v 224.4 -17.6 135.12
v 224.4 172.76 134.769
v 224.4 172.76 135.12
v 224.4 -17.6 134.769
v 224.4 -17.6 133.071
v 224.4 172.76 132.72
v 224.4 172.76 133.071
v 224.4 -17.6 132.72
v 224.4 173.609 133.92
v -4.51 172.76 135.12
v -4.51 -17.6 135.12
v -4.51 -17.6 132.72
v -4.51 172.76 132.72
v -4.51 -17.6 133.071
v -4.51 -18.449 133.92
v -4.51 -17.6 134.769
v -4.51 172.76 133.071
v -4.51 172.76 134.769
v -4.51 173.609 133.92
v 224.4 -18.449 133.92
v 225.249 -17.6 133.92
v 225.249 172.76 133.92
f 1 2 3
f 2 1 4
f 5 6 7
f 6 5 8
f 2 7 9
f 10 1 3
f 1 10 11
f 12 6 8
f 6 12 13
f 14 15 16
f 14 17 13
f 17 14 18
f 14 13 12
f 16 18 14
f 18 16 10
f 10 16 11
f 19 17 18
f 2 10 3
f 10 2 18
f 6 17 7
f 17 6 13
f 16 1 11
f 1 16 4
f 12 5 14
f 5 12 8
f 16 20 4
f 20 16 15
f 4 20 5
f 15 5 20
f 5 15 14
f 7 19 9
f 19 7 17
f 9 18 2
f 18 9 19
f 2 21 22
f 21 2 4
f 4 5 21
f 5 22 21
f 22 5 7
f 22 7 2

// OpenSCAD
// file: front_panel.scad
// Parametric Mini-ITX Case
// https://github.com/eclecticc/ParametricCase
//
// BSD 2-Clause License
// Copyright (c) 2018, Nirav Patel, http://eclecti.cc
//
// Front panel USB modules

include <defaults.scad>;

port_cutout = [15.1, 7.7];
port = [14.45, 7.00];
port_spacing = (11.84+42.08)/2;
screw_spacing = (56.71+62.80)/2;
screw_r = 3.1/2;
dual_usb_size = [67.5, 40.0, 11.0];

module dual_usb() {
    $fn = 20;
    
    color(c = [0.2, 0.2, 0.2]) {
        difference() {
            translate([-dual_usb_size[0]/2, 0, 0]) cube(dual_usb_size);
            translate([-screw_spacing/2, -1, dual_usb_size[2]/2]) rotate([-90, 0, 0]) cylinder(r = screw_r, h = 10);
            translate([screw_spacing/2, -1, dual_usb_size[2]/2]) rotate([-90, 0, 0]) cylinder(r = screw_r, h = 10);
        }
    }
    color("Silver", 1.0) {
        translate([port_spacing/2, -1, dual_usb_size[2]/2]) {
            translate([-port[0]/2, 0, -port[1]/2]) cube([port[0], 2, port[1]]);
            translate([-port[0]/2-port_spacing, 0, -port[1]/2]) cube([port[0], 2, port[1]]);
        }
    }
}

module dual_usb_cutout() {
    $fn = 20;
    translate([-screw_spacing/2, -wall-extra/2, dual_usb_size[2]/2]) rotate([-90, 0, 0]) cylinder(r = screw_r, h = wall+extra);
    translate([screw_spacing/2, -wall-extra/2, dual_usb_size[2]/2]) rotate([-90, 0, 0]) cylinder(r = screw_r, h = wall+extra);
    translate([port_spacing/2, -wall-extra/2, dual_usb_size[2]/2]) {
        translate([-port[0]/2, 0, -port[1]/2]) cube([port[0], wall+extra, port[1]]);
        translate([-port[0]/2-port_spacing, 0, -port[1]/2]) cube([port[0], wall+extra, port[1]]);
    }
}

//dual_usb();
//% dual_usb_cutout();
// file: power_switch.scad
// Parametric Mini-ITX Case
// https://github.com/eclecticc/ParametricCase
//
// BSD 2-Clause License
// Copyright (c) 2018, Nirav Patel, http://eclecti.cc
//
// Power switch modules

include <defaults.scad>;

power_switch_r = 16/2;
power_switch_h = 30;

module power_switch() {
    $fn = 50;
    
    // Body of the switch
    color("Silver", 1.0) {
        translate([0, 0, -power_switch_h]) cylinder(r = power_switch_r, h = power_switch_h);
        difference() {
            cylinder(r = 19/2, h = 1.6);
            cylinder(r = 12/2, h = 2);
        }
        cylinder(r = 10/2, h = 1.7);
    }
    
    // LED ring
    color("OrangeRed", 0.8) {
        difference() {
            cylinder(r = 12/2, h = 1.6);
            cylinder(r = 10/2, h = 2);
        }
    }
}

module power_switch_cutout() {
    $fn = 50;
    
    // Chassis cut-out
    translate([0, 0, -wall-extra/2]) cylinder(r = power_switch_r + 0.2, h = wall+extra);
}

//power_switch();
//% power_switch_cutout();
// file: motherboard.scad
// Parametric Mini-ITX Case
// https://github.com/eclecticc/ParametricCase
//
// BSD 2-Clause License
// Copyright (c) 2018, Nirav Patel, http://eclecti.cc
//
// Motherboard modules

include <defaults.scad>;

// Base PCB dimensions
miniitx = [170, 170, pcb_thickness];

// Motherboard mounting hold diameter and offsets (relative to hole c)
miniitx_hole = 3.96;
miniitx_hole_c = [10.16, 6.35];
miniitx_hole_f = [22.86, 157.48];
miniitx_hole_h = [154.94, 0];
miniitx_hole_j = [154.94, 157.48];

// Keepouts on top and bottom of board
miniitx_bottom_keepout = 0.25 * 25.4;

// AM4 Socket specs
am4_holes = [80, 95, 54, 90]; // Center not measured
am4_socket = [40, 40, 7.35]; // Not measured

// Offset from origin corner of motherboard to the base of the PCI-e card
pci_e_offset = [46.94+10.16, 47.29-45.72+6.35, 114.55-111.15];

module motherboard_miniitx(show_keepouts, socket_holes, socket) {
    area_a_keepout = [27, 15, 170-27-30, 170-15, 57];
    area_b_keepout = [0, 0, 170, 15, 16];
    area_c_keepout = [170-30, 15, 30, 170-15, 38];
    area_d_keepout = [0, 15, 27, 170-15, 39];
    $fn = 20;

    difference() {
        union() {
            // The PCB
            color("Green", 1.0) {
                cube(miniitx);
            }
            translate([socket_holes[0]-socket[0]/2, socket_holes[1]-socket[1]/2, miniitx[2]]) {
                color("OldLace", 1.0) {
                    cube(socket);
                }
            }
        }

        // Mounting holes for the motherboard
        translate([miniitx_hole_c[0], miniitx_hole_c[1], -extra/2]) {
            cylinder(r = miniitx_hole/2, h = miniitx[2]+extra);
            for (hole = [miniitx_hole_f, miniitx_hole_h, miniitx_hole_j]) {
                translate([hole[0], hole[1], 0]) cylinder(r = miniitx_hole/2, h = miniitx[2]+extra);
            }
        }

        // Mounting holes for the CPU cooler
        translate([socket_holes[0], socket_holes[1], -extra/2]) {
            for (i = [-socket_holes[2]/2, socket_holes[2]/2]) {
                for (j = [-socket_holes[3]/2, socket_holes[3]/2]) {
                    translate([i, j, 0]) cylinder(r = miniitx_hole/2, h = miniitx[2]+extra);
                }
            }
        }
    }

    // PCI-e slot
    color("DarkSlateGray", 1.0) {
        translate([pci_e_offset[0]-14.5, pci_e_offset[1]-7.5/2, miniitx[2]]) cube([89.0, 7.5, 11.25]);
    }

    // Keepouts for visualization purposes
    color("GreenYellow", 0.25) {
        if (show_keepouts == true) {
            translate([0, 0, -miniitx_bottom_keepout]) cube([miniitx[0], miniitx[1], miniitx_bottom_keepout]);

            for (keepout = [area_a_keepout, area_b_keepout, area_c_keepout, area_d_keepout]) {
                translate([keepout[0], keepout[1], miniitx[2]]) {
                    cube([keepout[2], keepout[3], keepout[4]]);
                }
            }
        }
    }
}

motherboard_back_edge = miniitx_hole_c[0]-12.27;
motherboard_back_panel_overhang = 158.75+7.52+6.35-miniitx[1];
motherboard_back_panel_lip = 2.54;
motherboard_back_panel_size = [158.75, 44.45];

module motherboard_back_panel_cutout() {
    // Cut-out for the back panel i/o
    translate([-extra/2+motherboard_back_edge-wall, miniitx_hole_c[1]+7.52, -2.24]) {
        cube([extra/2+wall+motherboard_back_edge+39, motherboard_back_panel_size[0], motherboard_back_panel_size[1]]);
        // Thin a 2.54mm area around the i/o down to a typical sheet metal thickness
        translate([0, -motherboard_back_panel_lip, -motherboard_back_panel_lip]) cube([extra/2+wall-1.2, 158.75+motherboard_back_panel_lip*2, 44.45+motherboard_back_panel_lip*2]);
    }
}

//motherboard_miniitx(false, am4_holes, am4_socket);
//% motherboard_back_panel_cutout();
// file: gpu.scad
// Parametric Mini-ITX Case
// https://github.com/eclecticc/ParametricCase
//
// BSD 2-Clause License
// Copyright (c) 2018, Nirav Patel, http://eclecti.cc
//
// PCI-e GPU modules

include <defaults.scad>;
include <fan.scad>;
include <pci_bracket.scad>;

pci_e_front_edge = -57.15;
pci_e_cutout_height = 8.25+(111.15-106.65);
pci_e_spacing = 47.29-26.97;
// Transform from pci e card datum to bracket datum
pci_e_to_bracket = [-64.13, 2.84-pcb_thickness, 100.36];

module dual_gpu( length, height) {
    // Using the bottom center of the notch as the datum
    color("Green", 1.0) {
        difference() {
            translate([pci_e_front_edge, -pcb_thickness/2, 0]) cube([length, pcb_thickness, height]);
            translate([pci_e_front_edge-extra, -pcb_thickness/2-extra/2, 0-extra]) cube([-pci_e_front_edge+extra-12.15, pcb_thickness+extra, pci_e_cutout_height]);
            translate([72.15, -pcb_thickness/2-extra/2, 0-extra]) cube([length-72.15+extra, pcb_thickness+extra, pci_e_cutout_height]);
        }
    }

    translate(pci_e_to_bracket) {
        pci_bracket();
        translate([0, -pci_e_spacing, 0]) pci_bracket();
    }
}

module dual_gpu_cutout() {
    slot_extra = 0.1;

    translate(pci_e_to_bracket) {
        pci_bracket_cutout();
        translate([0, -pci_e_spacing, 0]) pci_bracket_cutout();
        // Handle the gap between the two brackets, typically one piece on dual slot GPUs
        translate([-(11.43-5.08), -pci_e_spacing, 0]) cube([11.43, pci_e_spacing, 50]);
    }
}

zotac_1080_mini_pcb = [172.48, 110];
zotac_1080_thickness = 41.9;
zotac_1080_mini_length = 36+zotac_1080_mini_pcb[0]; // TODO: Needs measurement
zotac_1080_front_fan = 100;
zotac_1080_back_fan = 90;

module zotac_1080_mini() {
    // Brackets and PCB
    dual_gpu(zotac_1080_mini_pcb[0], 111.15);

    fan_thickness = 15;

    // Body
    color("DimGray", 1.0) {
        translate([pci_e_front_edge, -(zotac_1080_thickness-3)+fan_thickness, pci_e_cutout_height]) {
            cube([zotac_1080_mini_length, zotac_1080_thickness-fan_thickness, zotac_1080_mini_pcb[1]]);
        }
    }

    // Add the fans
    translate([pci_e_front_edge, -(zotac_1080_thickness-3), pci_e_cutout_height+zotac_1080_mini_pcb[1]/2]) {

        translate([zotac_1080_back_fan/2, 0, 0]) rotate([-90, 0, 0]) fan(zotac_1080_back_fan, fan_thickness, 9);
        translate([zotac_1080_back_fan+zotac_1080_front_fan/2, 0, 0]) rotate([-90, 0, 0]) fan(zotac_1080_front_fan, fan_thickness, 8);
    }
}

module zotac_1080_mini_cutout() {
    dual_gpu_cutout();

    // Side panel fan cutouts
    translate([pci_e_front_edge+(zotac_1080_back_fan+zotac_1080_front_fan)/2, -(zotac_1080_thickness-3), pci_e_cutout_height+zotac_1080_mini_pcb[1]/2]) {
        rotate([90, 0, 0]) {
            vent_rectangular([zotac_1080_back_fan+zotac_1080_front_fan, zotac_1080_front_fan], 10, 2.0);
        }
    }

    // Front panel cutout
    translate([pci_e_front_edge+zotac_1080_mini_length, -(zotac_1080_thickness-3)/2+wall, pci_e_cutout_height+zotac_1080_mini_pcb[1]/2]) {
        rotate([0, 90, 0]) {
            vent_rectangular([zotac_1080_front_fan, zotac_1080_thickness], 10, 2.0);
        }
    }
}


accelero_970_pcb = [172.48, 110];
accelero_970_thickness = 40;
accelero_970_length = 36+accelero_970_pcb[0]; // TODO: Needs measurement
accelero_970_height = accelero_970_pcb[1] + 50;
accelero_970_depth = accelero_970_thickness + 20;

accelero_970_main_fan = 120;

module accelero_970() {
    // Brackets and PCB
    dual_gpu(accelero_970_pcb[0], 111.15);

    fan_thickness = 20;

    // Body
    color("DimGray", 1.0) {
        translate([pci_e_front_edge, -(accelero_970_thickness/2), pci_e_cutout_height]) {
            union(){
                //cube([accelero_970_length, accelero_970_thickness-fan_thickness, accelero_970_pcb[1]]);
                translate([accelero_970_length-160, -accelero_970_thickness/2, 10]){
                    cube([138, accelero_970_thickness, 136]);
                }
            }
        }
    }

    // Add the fan
    translate([pci_e_front_edge, -(accelero_970_thickness/2), pci_e_cutout_height+accelero_970_pcb[1]/2]) {
        translate([accelero_970_length-90, -accelero_970_thickness, 20]) rotate([-90, 0, 0]) fan(accelero_970_main_fan, fan_thickness, 9);
    }
}

module accelero_970_cutout() {
    dual_gpu_cutout();

    // Side panel fan cutouts
    translate([pci_e_front_edge+(accelero_970_main_fan),
               -(accelero_970_thickness)-40,
               pci_e_cutout_height+accelero_970_pcb[1]/2 + 20]) {
        rotate([90, 0, 0]) {
            vent_rectangular([accelero_970_main_fan, accelero_970_main_fan], 10, 2.0);
        }
    }
}


// zotac_1080_mini();
// %zotac_1080_mini_cutout();

// translate ([300, 0, 0]){
//     accelero_970();
//     %accelero_970_cutout();
// }
// file: heatsink.scad
include <defaults.scad>;
include <fan.scad>;

// Generic rectangular heatsink with fins
module heatsink(size, base, fins) {
    translate([-size[0]/2, -size[1]/2, 0]) {
        color("Gainsboro") {
            difference() {
                cube(size);
                for (i = [0:fins-1]) {
                    translate([-extra/2, i*(size[1]-size[1]/fins/3)/fins + size[1]/fins/3, base]) cube([size[0]+extra, 2*size[1]/fins/3, size[2]-base+extra]);
                }
            }
        }
    }
}

aio_pump_size = [50, 50, 50]; // TODO: Use the actual Corsair H60 size

// A generic placeholder for an AIO cooling system pump
module aio_pump() {
    color("DarkSlateGray", 1.0) {
        translate([-aio_pump_size[0]/2, -aio_pump_size[1]/2, 0]) cube(aio_pump_size);
    }
}

cryorig_c7_size = [97, 97, 47+15];

module cryorig_c7() {
    heatsink([cryorig_c7_size[0], cryorig_c7_size[1], cryorig_c7_size[2]-15], 5, 57);
    translate([0, 0, 47]) fan(92, 15, 11);
}

noctua_nh_l12s_size = [146, 128, 70];

module noctua_nh_l12s() {
    translate([noctua_nh_l12s_size[0]/2-66, 0, noctua_nh_l12s_size[2]-20]) heatsink([noctua_nh_l12s_size[0], noctua_nh_l12s_size[1], 20], 0, 80);
    translate([noctua_nh_l12s_size[0]/2-66, 0, noctua_nh_l12s_size[2]-15-20]) fan(120, 15, 9);
    color("Gainsboro") {
        translate([-20, -20, 0]) cube([40, 40, 15]);
    }
}

noctua_nh_u9s_size = [95, 95, 125];

module noctua_nh_u9s() {
    color("Gainsboro") {
        translate([-noctua_nh_u9s_size[0]/2, -noctua_nh_u9s_size[1]/2, 0]) cube(noctua_nh_u9s_size);
    }
}

// Dimensions including stock fan
corsair_h60_size = [27+25, 152, 120];
corsair_h60_fan = [120, 25];
corsair_h60_fan_offset = 4; // TODO: Need to measure actual offset

// Corsair Hydro H60 all in one CPU cooler
module corsair_h60() {
    fan_thickness = 25;
    color("DarkSlateGray", 1.0) {
        translate([fan_thickness, 0, 0]) {
            cube([corsair_h60_size[0]-fan_thickness, corsair_h60_size[1], corsair_h60_size[2]]);
            
            // Add placeholders for the tubes
            tube_r = 6; // TODO: measure this
            translate([0, corsair_h60_size[1]-tube_r, corsair_h60_size[2]/4]) {
                rotate([0, -90, 0]) cylinder(r = tube_r, h = 50);
                translate([0, 0, corsair_h60_size[2]/2]) rotate([0, -90, 0]) cylinder(r = tube_r, h = 50);
            }
        }
    }
    
    translate([0, corsair_h60_size[1]/2-corsair_h60_fan_offset, corsair_h60_fan[0]/2]) rotate([0, 90, 0]) fan(corsair_h60_fan[0], fan_thickness, 7);
}

// Build the heatsink from the name of it
module heatsink_type(type) {
    if (type == "cryorig_c7") {
        cryorig_c7();
    } else if (type == "noctua_nh_l12s") {
        noctua_nh_l12s();
    } else if (type == "noctua_nh_u9s") {
        noctua_nh_u9s();
    } else if (type == "aio") {
        aio_pump();
    } else {
        echo("Unknown heatsink ", type);
    }
}

_heatsinks=[ 
        ["cryorig_c7", cryorig_c7_size[2]], 
        ["noctua_nh_l12s", noctua_nh_l12s_size[2]],
        ["noctua_nh_u9s", noctua_nh_u9s_size[2]],
        ["aio", aio_pump_size[2]]
        ];

// Return the height of the heatsink from the name of it
function heatsink_height(heatsink) = _heatsinks[search([heatsink], _heatsinks, 1, 0)[0]][1];

//heatsink_type("noctua_nh_l12s");

//cryorig_c7();
//noctua_nh_l12s();
//corsair_h60();
// file: psu.scad
include <defaults.scad>;
include <fan.scad>;

iec_size = [3, 24, 31];

module iec() {
    // IEC C14 placeholder
    color("DarkSlateGray", 1.0) {
        difference() {
            cube(iec_size);
            translate([-extra/2, 4, 3.5]) cube([2+extra/2, 16, 24]);
        }
    }
}

sfx_size = [100, 125, 63.5];
sfx_hole = 3.3;
sfx_holes = [[6.0, 6.0+113.0], [6.0, 6.0+25.7, 6.0+51.5]];

module sfx() {
    fan_size = 92;
    
    color("Silver", 1.0) {
        difference() {
            $fn = 20;
            
            cube(sfx_size);
            
            // Cut out for the fan
            translate([(sfx_size[0]-fan_size)/2, (sfx_size[1]-fan_size)/2, -extra/2]) cube([fan_size, fan_size, 15]);
            // Cut out the standard mounting holes
            for (y = sfx_holes[0]) {
                for (z = sfx_holes[1]) {
                    translate([-extra, y, z]) {
                        rotate([0, 90, 0]) cylinder(r = sfx_hole/2, h = 30);
                    }
                }
            }
        }
    }
    
    // Add a 92mm fan in the location used by Silverstone
    translate([sfx_size[0]/2, sfx_size[1]/2, 0]) fan(fan_size, 15, 8);
    
    // IEC C14 placeholder
    translate([-iec_size[0], sfx_size[1]-30+iec_size[2]/2, sfx_size[2]/2-iec_size[1]/2]) {
        rotate([90, 0, 0]) iec();
    }
}

sfx_l_size = [130, 125, 63.5];

module sfx_l() {
    $fn = 20;
    fan_size = 120;
    
    color("Silver", 1.0) {
        difference() {
            $fn = 20;
            
            cube(sfx_l_size);
            
            // Cut out for the fan
            translate([(sfx_l_size[0]-fan_size)/2, (sfx_l_size[1]-fan_size)/2, -extra/2]) cube([fan_size, fan_size, 15]);
            // Cut out the standard mounting holes
            for (y = sfx_holes[0]) {
                for (z = sfx_holes[1]) {
                    translate([-extra, y, z]) {
                        rotate([0, 90, 0]) cylinder(r = sfx_hole/2, h = 30);
                    }
                }
            }
        }
    }
    
    // Add a 92mm fan in the location used by Silverstone
    translate([sfx_l_size[0]/2, sfx_l_size[1]/2, 0]) fan(fan_size, 15, 9);
    
    // IEC C14 placeholder
    translate([-iec_size[0], sfx_l_size[1]-30+iec_size[2]/2, sfx_l_size[2]/2-iec_size[1]/2]) {
        rotate([90, 0, 0]) iec();
    }
}

module sfx_cutout() {
    $fn = 20;
    
    // Cut out the standard mounting holes
    for (y = sfx_holes[0]) {
        for (z = sfx_holes[1]) {
            translate([-15, y, z]) {
                rotate([0, 90, 0]) cylinder(r = sfx_hole/2, h = 30);
            }
        }
    }
    
    // Exhaust cutout
    translate([-15, sfx_holes[0][0]+wall+sfx_hole/2, wall]) cube([30, sfx_size[1]-wall*2-sfx_hole-sfx_holes[0][0]*2, sfx_size[2]-wall*2]);
}

flexatx_size = [150, 81.5, 40];
flexatx_hole = 3.3;
flexatx_hole_a = [81.5-75.9, 4.1];
flexatx_hole_b = [81.5-75.9, 4.1+31.5];
flexatx_hole_c = [81.5-15.2, 36.5];

module flexatx() {
    color("Silver", 1.0) {
        difference() {
            $fn = 20;
            
            cube(flexatx_size);
            
            // Cut out the standard mounting holes
            for (hole = [flexatx_hole_a, flexatx_hole_b, flexatx_hole_c]) {
                translate([-extra, hole[0], hole[1]]) {
                    rotate([0, 90, 0]) cylinder(r = flexatx_hole/2, h = 30);
                }
            }
            translate([-extra, flexatx_size[1]-52.4-40/2, -extra/2]) cube([15+extra, 40, 40+extra]);
        }
    }
    
    // Add a 40mm fan in the location used by Delta
    translate([0, flexatx_size[1]-52.4, flexatx_size[2]/2]) rotate([0, 90, 0]) fan(40, 15, 6);
    
    // IEC C14 placeholder
    translate([-iec_size[0], flexatx_size[1]-iec_size[1]-4.4, 2]) {
        iec();
    }
}

module flexatx_cutout(fan) {
    $fn = 20;
    cutout_extra = 0.5;
    
    // Mounting holes
    for (hole = [flexatx_hole_a, flexatx_hole_b, flexatx_hole_c]) {
        translate([-15, hole[0], hole[1]]) {
            rotate([0, 90, 0]) cylinder(r = flexatx_hole/2, h = 30);
        }
    }
    
    // IEC power plug hole
    translate([-15, flexatx_size[1]-iec_size[1]-4.4-cutout_extra, 2-cutout_extra]) {
        cube([30, iec_size[1]+cutout_extra*2, iec_size[2]+cutout_extra*2]);
    }
    
    // Fan hole
    if (fan == true) {
        $fn = 50;
        
        translate([-15, flexatx_size[1]-52.4, flexatx_size[2]/2]) rotate([0, 90, 0]) cylinder(r = 19, h = 30);
    }
}

// Build the heatsink from the name of it
module psu_type(type) {
    if (type == "flexatx") {
        flexatx();
    } else if (type == "sfx") {
        sfx();
    } else if (type == "sfx_l") {
        sfx_l();
    } else {
        echo("Unknown psu ", type);
    }
}

_psus=[ 
        ["flexatx", flexatx_size], 
        ["sfx", sfx_size],
        ["sfx_l", sfx_l_size],
        ];

// Return the height of the heatsink from the name of it
function psu_size(psu) = _psus[search([psu], _psus, 1, 0)[0]][1];

//psu_type("sfx");

//flexatx();
//% flexatx_cutout(true);

//sfx();
//% sfx_cutout();

//sfx_l();
//% sfx_cutout();
// file: vent.scad
// Parametric Mini-ITX Case
// https://github.com/eclecticc/ParametricCase
//
// BSD 2-Clause License
// Copyright (c) 2018, Nirav Patel, http://eclecti.cc
//
// Parametric vent cutout modules

module vent_rectangular(size, pitch, wall) {
    // Adjust the pitch to fit the total size
    fixed_pitch = size[0]/floor(size[0]/pitch);
    
    // Holes for ventilation
    // TODO: Taper the holes to reduce turbulance
    for (x = [-size[0]/2:fixed_pitch:size[0]/2-fixed_pitch]) {
        for (y = [-size[1]/2:fixed_pitch:size[1]/2-fixed_pitch]) {
            translate([x+wall/2, y+wall/2, -30]) cube([fixed_pitch-wall, fixed_pitch-wall, 60]);
        }
    }
}

module vent_circular(r, pitch, wall) {
    $fn = 100;
    
    intersection() {
        vent_rectangular([r*2, r*2], pitch, wall);
        cylinder(r = r, h = 30, center = true);
    }
}

module vent_rounded_rect(r, size, pitch, wall) {
    $fn = 100;
    
    intersection() {
        vent_rectangular(size, pitch, wall);
        cylinder(r = r, h = 30, center = true);
    }
}

//vent_rounded_rect(60, [100, 100], 10, 2);
// file: fan.scad
// Parametric Mini-ITX Case
// https://github.com/eclecticc/ParametricCase
//
// BSD 2-Clause License
// Copyright (c) 2018, Nirav Patel, http://eclecti.cc
//
// Case fan modules

include <defaults.scad>;
include <vent.scad>;

_hole_spacings=[
        [220, 170],
        [200, 154],
        [140, 124.5],
        [120, 105],
        [92, 83],
        [80, 72],
        [70, 60],
        [60, 50],
        [50, 40],
        [40, 32]
        ];

function hole_spacing(size) = _hole_spacings[search([size], _hole_spacings, 1, 0)[0]][1];

fan_screw_r = 4.4;
fan_screw_head_r = 6.6;

module fan(size, thickness, blades) {
    // Center at base of exhaust side is datum
    $fn = 50;
    fan_wall = 1;
    
    color("DarkSlateGray", 1.0) {
        difference() {
            translate([-size/2, -size/2, 0]) {
                cube([size, size, thickness]);
            }
            translate([0, 0, -extra/2]) cylinder(r = size/2-fan_wall, h = thickness + extra);
            
            // Holes for the fan screws
            hole_spacing = hole_spacing(size);
            if (!is_undef(hole_spacing)) { // Might be undefined if used for an integrated fan
                for (x = [-hole_spacing/2, hole_spacing/2]) {
                    for (y = [-hole_spacing/2, hole_spacing/2]) {
                        translate([x, y, -extra/2]) cylinder(r = fan_screw_r/2, h = thickness+extra);
                    }
                }
            }
        }
    }
    
    color("Snow", 1.0) {
        cylinder(r = size/5, h = thickness);
        intersection() {
            for (i = [0:blades]) {
                rotate([0, 0, i*360/blades]) translate([0, -thickness/2, thickness/4]) rotate([-60, 0, 0]) cube([size/2, 1, thickness]);
            }
            cylinder(r = size/2-fan_wall*2, h = thickness);
        }
    }
}

module fan_cutout(size) {
    $fn = 20;
    hole_spacing = hole_spacing(size);
    
    vent_rounded_rect(size/2*1.1, [size, size], 10, 2.0);
    
    // Countersunk holes for the fan screws
    for (x = [-hole_spacing/2, hole_spacing/2]) {
        for (y = [-hole_spacing/2, hole_spacing/2]) {
            translate([x, y, 0]) {
                cylinder(r = fan_screw_head_r/2, h = 15);
                translate([0, 0, -1.2]) cylinder(r1 = fan_screw_r/2, r2 = fan_screw_head_r/2, h = 1.2);
                translate([0, 0, -15]) cylinder(r = fan_screw_r/2, h = 15);
            }
        }
    }
}

//fan(120, 25, 9);
//% fan_cutout(120);
// file: pci_bracket.scad
include <defaults.scad>

pci_bracket_thickness = 0.86;
pci_bracket_hole = 4.42;
pci_bracket_width = 18.42;
pci_bracket_tab_offset = 4.11;
pci_bracket_tab_width = 14.30-pci_bracket_tab_offset;

module pci_bracket() {
    $fn = 20;
    
    color("DarkGray", 1.0) rotate([0, 0, 180]) {
        // Using the center of the screw hole where it intersects the case as datum
        hole_overhang = 21.59-pci_bracket_width;
        difference() {
            translate([-5.08, -hole_overhang, 0]) {
                cube([11.43, pci_bracket_width, pci_bracket_thickness]);
                translate([-pci_bracket_thickness, 0, -4.56]) cube([pci_bracket_thickness, pci_bracket_width, 4.56+pci_bracket_thickness]);
            }
            translate([0, 0, -extra/2]) {
                cylinder(r = pci_bracket_hole/2, h = pci_bracket_thickness+extra);
                translate([-pci_bracket_hole/2, -hole_overhang-extra, -extra]) {
                    cube([pci_bracket_hole, hole_overhang+extra, pci_bracket_thickness+extra*2]);
                }
            }
            translate([-5.08-pci_bracket_thickness-extra/2, -hole_overhang, -2.92]) rotate([225, 0, 0]) cube([pci_bracket_thickness+extra, 3, 3]);
        }
        
        translate([-5.08-pci_bracket_thickness, 0, -112.75]) {
            difference() {
                cube([pci_bracket_thickness, pci_bracket_width, 112.75+pci_bracket_thickness]);
                translate([-extra/2, pci_bracket_width-2.54, 112.75-3.94+pci_bracket_thickness]) {
                    cube([pci_bracket_thickness+extra, 2.54+extra, 3.94+extra]);
                    rotate([-45, 0, 0]) cube([pci_bracket_thickness+extra, 2.54+extra, 3.94+extra]);
                }
                
                translate([-extra/2, pci_bracket_tab_offset, 0]) rotate([135, 0, 0]) cube([pci_bracket_thickness+extra, 10, 10]);
                translate([-extra/2, pci_bracket_width-pci_bracket_tab_offset, 0]) rotate([-45, 0, 0]) cube([pci_bracket_thickness+extra, 10, 10]);
            }
        }
        
        translate([-5.08-pci_bracket_thickness, pci_bracket_tab_offset, -120.02]) {
            cube([pci_bracket_thickness, pci_bracket_tab_width, 120.02+pci_bracket_thickness]);
        }
    }
}

pci_bracket_back_edge = -(11.43-5.08);
pci_bracket_right_edge = -pci_bracket_width+2.54;
pci_bracket_slot_extra = 0.1;
pci_bracket_total_width = 21.59;

module pci_bracket_cutout() {
    io_cutout = [12.06, 89.90];
    
    minkowski() {
        pci_bracket();
        cube([pci_bracket_slot_extra*2, pci_bracket_slot_extra*2, pci_bracket_slot_extra*2], true);
    }

    // I/O Cutout
    translate([-15, -2.84-0.35-io_cutout[0], -10.16-io_cutout[1]]) {
        cube([30, io_cutout[0], io_cutout[1]]);
    }
    
    // Slot above the bracket to allow vertical insertion of card
    translate([pci_bracket_back_edge, pci_bracket_right_edge-pci_bracket_slot_extra, 0]) cube([11.43, pci_bracket_total_width+pci_bracket_slot_extra*2-2.54, 50]);
}

//pci_bracket();
//% pci_bracket_cutout();
// file: defaults.scad
// Parametric Mini-ITX Case
// https://github.com/eclecticc/ParametricCase
//
// BSD 2-Clause License
// Copyright (c) 2018, Nirav Patel, http://eclecti.cc
//
// Convenience defaults that apply across all modules

// Some default convenience variables
extra = 1.0;
// Thickness of case walls
wall = 2.4;
// Default PCB thickness for motherboard and GPU
pcb_thickness = 1.57;
// main file
// Parametric Mini-ITX Case
// https://github.com/eclecticc/ParametricCase
//
// BSD 2-Clause License
// Copyright (c) 2018, Nirav Patel, http://eclecti.cc
//
// The main file with the case itself

include <defaults.scad>;
include <pci_bracket.scad>;
include <fan.scad>;
include <vent.scad>;
include <psu.scad>;
include <heatsink.scad>;
include <gpu.scad>;
include <motherboard.scad>;
include <power_switch.scad>;
include <front_panel.scad>;

// Uxcell M3 threaded inserts from Amazon
insert_r = 5.3/2+0.1;
insert_h = 5.0;

module motherboard_standoff() {
    difference() {
        cylinder(r = (0.4*25.4)/2, h = miniitx_bottom_keepout);
        translate([0, 0, miniitx_bottom_keepout-insert_h]) cylinder(r = insert_r - 0.1, h = insert_h+extra);
    }
}

module motherboard_standoffs_miniitx() {
    $fn = 50;

    // Mounting holes for the motherboard
    translate([miniitx_hole_c[0], miniitx_hole_c[1], 0]) {
        motherboard_standoff();
        for (hole = [miniitx_hole_f, miniitx_hole_h, miniitx_hole_j]) {
            translate([hole[0], hole[1], 0]) motherboard_standoff();
        }
    }
}

// Just a little wedge to provide support for the PSU
module psu_ledge() {
    cube_size = 15;
    translate([0, extra, 0]) difference() {
        translate([-cube_size/2, 0, 0]) rotate([-45, 0, 0]) cube([cube_size, cube_size, cube_size], true);
        translate([-cube_size*1.5, -cube_size*1.5, 0]) cube([cube_size*2, cube_size*2, cube_size*2]);
        translate([-cube_size*1.5, 0, -cube_size*1.5]) cube([cube_size*2, cube_size*2, cube_size*2]);
    }
}

module psu_corner_ledge() {
    cube_size = 25;
    translate([-extra, -extra, 0]) difference() {
        translate([-cube_size/5, -cube_size/5, 0]) rotate([0, 0, -45]) rotate([45, 0, 0]) cube([cube_size, cube_size, cube_size], true);
        translate([-cube_size*1.1, -cube_size*1.1, 0]) cube([cube_size*2, cube_size*2, cube_size*2]);
        translate([-cube_size*2, -cube_size*1.1, -cube_size]) cube([cube_size*2, cube_size*2, cube_size*2]);
        translate([-cube_size*1.1, -cube_size*2, -cube_size]) cube([cube_size*2, cube_size*2, cube_size*2]);
    }
}

module cable_wrap_holder() {
    wrap_width = 15;

    difference () {
        translate([wall, -wall-wrap_width/2, 0]) {
            cube([wall, wall*2+wrap_width, wall*2]);
            translate([-wall*1.5, 0, 0]) cube([wall*2, wall, wall*2]);
            translate([-wall*1.5, wall+wrap_width, 0]) cube([wall*2, wall, wall*2]);
            translate([wall, 0, 0]) rotate([0, -45-90, 0]) cube([wall*2, wall, wall*4]);
            translate([wall, wall+wrap_width, 0]) rotate([0, -45-90, 0]) cube([wall*2, wall, wall*4]);
        }
        translate([-wall/2-10, -wall-wrap_width, -10]) cube([10, wrap_width*2+wall*2, 20]);
    }
}

// The tab that the pci bracket screws into
module pci_bracket_holder() {
    tab_depth = 11.43;

    bottom_wall = 1.0;

    translate(pci_e_to_bracket) {
        difference() {
            // The body of the tab
            translate([pci_bracket_back_edge, -pci_e_spacing+pci_bracket_right_edge-pci_bracket_slot_extra, -tab_depth]) cube([tab_depth, pci_e_spacing+pci_bracket_total_width+pci_bracket_slot_extra*2-2.54, tab_depth]);
            // Chop it at 45 degrees to make it printable
            translate([pci_bracket_back_edge+tab_depth, -pci_e_spacing+pci_bracket_right_edge-pci_bracket_slot_extra-extra/2, -tab_depth]) rotate([0, -45-90, 0]) cube([tab_depth*2, pci_e_spacing+pci_bracket_total_width+pci_bracket_slot_extra*2-2.54+extra, tab_depth]);
        }
    }
}

module pci_bracket_holder_cutout() {
    $fn = 20;

    bottom_wall = 1.0;

    translate(pci_e_to_bracket) {
        // Cut out the holes for the threaded insert and the bolt
        translate([0, 0, -insert_h]) {
            cylinder(r = insert_r - 0.1, h = insert_h+extra);
            translate([0, 0, -bottom_wall-extra/2]) cylinder(r = 1.5, h = bottom_wall+extra);
        }
        translate([0, -pci_e_spacing, -insert_h]) {
            cylinder(r = insert_r - 0.1, h = insert_h+extra);
            translate([0, 0, -bottom_wall-extra/2]) cylinder(r = 1.5, h = bottom_wall+extra);
        }
    }
}

module top_lid(size) {
    cube([size[0], size[1], wall]);
    translate([0, 0, wall/2]) rotate([45, 0, 0]) translate([0, -wall/4, -wall/4]) cube([size[0], wall/2, wall/2]);
    translate([0, size[1], wall/2]) rotate([45, 0, 0]) translate([0, -wall/4, -wall/4]) cube([size[0], wall/2, wall/2]);
    translate([size[0], 0, wall/2]) rotate([45, 0, 90]) translate([0, -wall/4, -wall/4]) cube([size[1], wall/2, wall/2]);
}

module back_to_back() {
    motherboard_miniitx(false, am4_holes, am4_socket);

    translate([am4_holes[0], am4_holes[1], am4_socket[2]+miniitx[2]]) cryorig_c7();

    translate([0, miniitx[1]-flexatx_size[2], -miniitx_bottom_keepout-wall]) {
        rotate([-90, 0, 0]) flexatx();
    }

//    translate([pci_e_offset[0], pci_e_offset[1]+100, -40]) {
//        rotate([90, 0, 0]) zotac_1080_mini();
//    }
}

module traditional(show_body, show_lid, show_internals, heatsink_type, psu_type) {
    // Airflow clearance for CPU fan
    cpu_fan_clearance = 5;
    heatsink_height = heatsink_height(heatsink_type);
    psu_size = psu_size(psu_type);
    // Extra height for cable clearance for 8-pin connectors on the top of the card
    gpu_power_height = 5;
    // FIXME: gpu thickness doesn't account for bracket width
    gpu_location = [pci_e_offset[0], pci_e_offset[1], pci_e_offset[2]+miniitx[2]];
    case_origin = [motherboard_back_edge-wall, -20, -miniitx_bottom_keepout-wall]; // TODO: Clean up the Y calculation

    m2_size = [110, 22+10];
    m2_location = [miniitx[0]/2, 30];  // Note that this should be adjusted to match the mobo used

    case_fan_size = 140;
    case_fan_thickness = 25;
    case_exhaust_fan_size = 80;
    case_exhaust_fan_thickness = 15;

    // Figure out the stacked heights of the tallest components to use for case height
    psu_heatsink_stack = -case_origin[2]+miniitx[2]+am4_socket[2]+heatsink_height+cpu_fan_clearance+psu_size[2]+wall;
    gpu_stack = -case_origin[2]+wall+pci_e_offset[2]+miniitx[2]+pci_e_cutout_height+zotac_1080_mini_pcb[1]+gpu_power_height;

    // Figure out the stacked lengths of the longest components to use for case length
    miniitx_cooling_length = -motherboard_back_edge+wall*3+miniitx[0]+(heatsink_type == "aio" ? corsair_h60_size[0] : case_fan_thickness);
    gpu_length = zotac_1080_mini_length+wall*3; // Note the extra wall length for assembly margin

    case_size = [max(miniitx_cooling_length, 0), miniitx[1]-case_origin[1]+motherboard_back_panel_overhang+motherboard_back_panel_lip, max(psu_heatsink_stack, gpu_stack)];

    psu_location = [motherboard_back_edge, case_origin[1]+case_size[1]-psu_size[1]-wall-wall/4, case_origin[2]+case_size[2]-psu_size[2]-wall];

    cable_wrap_location = [psu_location[0] + psu_size[0] + (case_size[0] - psu_size[0])/3, case_origin[1]+case_size[1]-wall, case_origin[2]+case_size[2]-psu_size[2]-wall];

    case_fan_location = [case_size[0]-wall-case_fan_thickness, (case_fan_size >= 120) ? case_size[1]/2-case_origin[1]/2 : case_size[1]/2, case_fan_size/2+wall*2];
    case_exhaust_fan_location = [wall, case_size[1]-psu_size[1]-case_exhaust_fan_size/2-wall, case_size[2]-case_exhaust_fan_size/2-wall];

    power_switch_location = [case_origin[0]+case_size[0], case_origin[1]+power_switch_r+wall*2.5, case_origin[2]+power_switch_r+wall*2.5];
    dual_usb_location = [case_origin[0]+case_size[0]-wall, case_origin[1]+case_size[1]-wall-dual_usb_size[2]-0.5, case_origin[2]+case_size[2]/2];

    // Calculate the case size in liters
    case_volume = case_size[0]*case_size[1]*case_size[2]/1000000.0;
    echo("Case dimensions X:", case_size[0], " Y:", case_size[1], " Z:", case_size[2], " L:", case_volume);

    corsair_h60_location = [case_size[0]-wall-corsair_h60_size[0], case_size[1]-wall*2-corsair_h60_size[1], case_size[2]-wall*2-corsair_h60_size[2]];

    // Using the bottom corner of the motherboard near the GPU as the origin
    if (show_internals == true) {
        motherboard_miniitx(true, am4_holes, am4_socket);

        translate([am4_holes[0], am4_holes[1], am4_socket[2]+miniitx[2]]) {
            heatsink_type(heatsink_type);
        }

        translate(psu_location) psu_type(psu_type);
        if (psu_type == "flexatx") {
            // The exhaust fan only fits (sort of) with flexatx
            translate(case_origin)  {
                translate(case_exhaust_fan_location) {
                    rotate([0, 90, 0]) fan(case_exhaust_fan_size, case_exhaust_fan_thickness, 10);
                }
            }
        }

//        translate(gpu_location) {
//            zotac_1080_mini();
//        }

        translate(case_origin)  {
            // Put into place a radiator for AIO cooling
            if (heatsink_type == "aio") {
                translate(corsair_h60_location) {
                    corsair_h60();
                }
            } else {
                // Otherwise put a standard case fan in the front
                translate(case_fan_location) {
                    rotate([0, 90, 0]) fan(case_fan_size, case_fan_thickness, 10);
                }
            }
        }

        translate(power_switch_location) {
            rotate([0, 90, 0]) power_switch();
        }

        translate(dual_usb_location) {
               rotate([-90, 0, 0]) rotate([0, 0, 90]) dual_usb();
        }
    }

    // Make the lid separately so it can be printed on its own
    if (show_lid == true) color("WhiteSmoke", 0.5) {
        translate(case_origin) {
            translate([0, wall, case_size[2]-wall]) top_lid([case_size[0]-wall, case_size[1]-wall*2]);
        }
    }

    // The actual case
    if (show_body == true) color("WhiteSmoke", 0.5) {
        // Motherboard standoffs taking threaded inserts
        translate([0, 0, -miniitx_bottom_keepout]) {
            motherboard_standoffs_miniitx();
        }

        // Part that the GPU screws into
        translate(gpu_location) {
            difference() {
//                pci_bracket_holder();
//                pci_bracket_holder_cutout();
            }
        }

        // Attach ledges to the walls to help hold up the PSU
        translate(psu_location) {
            translate([psu_size[0], psu_size[1], 0]) psu_ledge();
            translate([0, psu_size[1], 0]) rotate([0, 0, -90]) psu_corner_ledge();
        }

        // Put some cable wrap holders on the wall near the PSU
        translate(cable_wrap_location) {
            rotate([0, 0, -90]) {
                cable_wrap_holder();
                translate([0, 0, psu_size[2]-wall*4]) cable_wrap_holder();
            }
        }

        difference() {
            // Body of the case
            translate(case_origin) {
                difference() {
                    cube(case_size);
                    translate([wall, wall, wall]) cube([case_size[0]-wall*2, case_size[1]-wall*2, case_size[2]]);
                    minkowski() {
                        translate([0-extra, wall, case_size[2]-wall]) top_lid([case_size[0]-wall+extra, case_size[1]-wall*2]);
                        cube([0.2, 0.2, 0.2], center = true);
                    }
                }
            }

            translate(case_origin) {
                translate([8, 0.2, 8]) {
                    rotate([90, 0, 0]) linear_extrude(wall) {
                        text(str(case_volume), font = "Helvetica:style=Normal", size = 20);
                    }
                }
            }

            motherboard_back_panel_cutout();

            // Put a vent in the bottom for a typical M.2 SSD location.
            translate([m2_location[0], m2_location[1], case_origin[2]]) vent_rectangular(m2_size, 10, 2.0);

            // Put in a vent for the radiator for AIO cooling
            if (heatsink_type == "aio") {
                translate(case_origin) translate(corsair_h60_location) translate([corsair_h60_size[0]+wall, corsair_h60_size[1]/2-corsair_h60_fan_offset, corsair_h60_fan[0]/2]) {
                    rotate([0, 90, 0]) {
                        fan_cutout(corsair_h60_fan[0]);
                    }
                }
            } else {
                // Otherwise put in a regular case fan vent
                translate(case_origin) translate([case_fan_location[0]+case_fan_thickness+wall, case_fan_location[1], case_fan_location[2]]) {
                    rotate([0, 90, 0]) {
                        fan_cutout(case_fan_size);
                    }
                }
            }

            if (psu_type == "sfx" || psu_type == "sfx_l") {
                translate(psu_location) {
                    sfx_cutout();
                }

                // Put in vents on the back wall to improve airflow
                back_panel_vent_v = [sfx_size[2], case_size[1]-zotac_1080_thickness-sfx_size[1]-wall*3];
                translate(psu_location) translate([0, -back_panel_vent_v[1]/2+wall, back_panel_vent_v[0]/2-wall]) {
                    rotate([0, 90, 0]) vent_rectangular(back_panel_vent_v, 10, 2.0);
                }

                back_panel_vent_h = [case_size[2]-sfx_size[2]-wall*3-motherboard_back_panel_size[1]-miniitx_bottom_keepout, case_size[1]-zotac_1080_thickness-wall*2];
                translate(psu_location) translate([0, sfx_size[1]-back_panel_vent_h[1]/2+wall, -back_panel_vent_h[0]/2]) {
                    rotate([0, 90, 0]) vent_rectangular(back_panel_vent_h, 10, 2.0);
                }

            } else {
                translate(psu_location) {
                    flexatx_cutout(true);
                }

                translate(case_origin) translate([case_exhaust_fan_location[0]-wall, case_exhaust_fan_location[1], case_exhaust_fan_location[2]]) {
                    rotate([0, -90, 0]) {
                        fan_cutout(case_exhaust_fan_size);
                    }
                }
            }

            translate(gpu_location) {
//                zotac_1080_mini_cutout();
//                pci_bracket_holder_cutout();
            }

            translate(power_switch_location) {
                rotate([0, 90, 0]) power_switch_cutout();
            }

            translate(dual_usb_location) {
               rotate([-90, 0, 0]) rotate([0, 0, 90]) dual_usb_cutout();
            }

            // Prevent corner lift by angling the bottom corners
            translate(case_origin) {
                rotate([0, 0, -45]) rotate([45, 0, 0]) cube([wall*3, wall*2, wall*2], center = true);
                translate([case_size[0], 0, 0]) rotate([0, 0, 45]) rotate([45, 0, 0]) cube([wall*3, wall*2, wall*2], center = true);
                translate([case_size[0], case_size[1], 0]) rotate([0, 0, 135]) rotate([45, 0, 0]) cube([wall*3, wall*2, wall*2], center = true);
                translate([0, case_size[1], 0]) rotate([0, 0, -135]) rotate([45, 0, 0]) cube([wall*3, wall*2, wall*2], center = true);
            }
        }
    }
}

module traditional_tower_cooler() {
    motherboard_miniitx(false, am4_holes, am4_socket);

    translate([am4_holes[0], am4_holes[1], am4_socket[2]+miniitx[2]]) noctua_nh_u9s();

    translate([0, miniitx[1]-flexatx_size[2], flexatx_size[1]+miniitx[2]+45]) rotate([-90, 0, 0]) {
        flexatx();
    }

//    translate([pci_e_offset[0], pci_e_offset[1], pci_e_offset[2]+miniitx[2]]) {
//        zotac_1080_mini();
//    }
}

traditional(show_body = false, show_lid = true, show_internals = false, heatsink_type = "aio", psu_type = "sfx");
//traditional(show_body = true, show_lid = false, show_internals = false, heatsink_type = "noctua_nh_l12s", psu_type = "sfx");
//traditional(show_body = true, show_lid = false, show_internals = true, heatsink_type = "aio", psu_type = "sfx");
